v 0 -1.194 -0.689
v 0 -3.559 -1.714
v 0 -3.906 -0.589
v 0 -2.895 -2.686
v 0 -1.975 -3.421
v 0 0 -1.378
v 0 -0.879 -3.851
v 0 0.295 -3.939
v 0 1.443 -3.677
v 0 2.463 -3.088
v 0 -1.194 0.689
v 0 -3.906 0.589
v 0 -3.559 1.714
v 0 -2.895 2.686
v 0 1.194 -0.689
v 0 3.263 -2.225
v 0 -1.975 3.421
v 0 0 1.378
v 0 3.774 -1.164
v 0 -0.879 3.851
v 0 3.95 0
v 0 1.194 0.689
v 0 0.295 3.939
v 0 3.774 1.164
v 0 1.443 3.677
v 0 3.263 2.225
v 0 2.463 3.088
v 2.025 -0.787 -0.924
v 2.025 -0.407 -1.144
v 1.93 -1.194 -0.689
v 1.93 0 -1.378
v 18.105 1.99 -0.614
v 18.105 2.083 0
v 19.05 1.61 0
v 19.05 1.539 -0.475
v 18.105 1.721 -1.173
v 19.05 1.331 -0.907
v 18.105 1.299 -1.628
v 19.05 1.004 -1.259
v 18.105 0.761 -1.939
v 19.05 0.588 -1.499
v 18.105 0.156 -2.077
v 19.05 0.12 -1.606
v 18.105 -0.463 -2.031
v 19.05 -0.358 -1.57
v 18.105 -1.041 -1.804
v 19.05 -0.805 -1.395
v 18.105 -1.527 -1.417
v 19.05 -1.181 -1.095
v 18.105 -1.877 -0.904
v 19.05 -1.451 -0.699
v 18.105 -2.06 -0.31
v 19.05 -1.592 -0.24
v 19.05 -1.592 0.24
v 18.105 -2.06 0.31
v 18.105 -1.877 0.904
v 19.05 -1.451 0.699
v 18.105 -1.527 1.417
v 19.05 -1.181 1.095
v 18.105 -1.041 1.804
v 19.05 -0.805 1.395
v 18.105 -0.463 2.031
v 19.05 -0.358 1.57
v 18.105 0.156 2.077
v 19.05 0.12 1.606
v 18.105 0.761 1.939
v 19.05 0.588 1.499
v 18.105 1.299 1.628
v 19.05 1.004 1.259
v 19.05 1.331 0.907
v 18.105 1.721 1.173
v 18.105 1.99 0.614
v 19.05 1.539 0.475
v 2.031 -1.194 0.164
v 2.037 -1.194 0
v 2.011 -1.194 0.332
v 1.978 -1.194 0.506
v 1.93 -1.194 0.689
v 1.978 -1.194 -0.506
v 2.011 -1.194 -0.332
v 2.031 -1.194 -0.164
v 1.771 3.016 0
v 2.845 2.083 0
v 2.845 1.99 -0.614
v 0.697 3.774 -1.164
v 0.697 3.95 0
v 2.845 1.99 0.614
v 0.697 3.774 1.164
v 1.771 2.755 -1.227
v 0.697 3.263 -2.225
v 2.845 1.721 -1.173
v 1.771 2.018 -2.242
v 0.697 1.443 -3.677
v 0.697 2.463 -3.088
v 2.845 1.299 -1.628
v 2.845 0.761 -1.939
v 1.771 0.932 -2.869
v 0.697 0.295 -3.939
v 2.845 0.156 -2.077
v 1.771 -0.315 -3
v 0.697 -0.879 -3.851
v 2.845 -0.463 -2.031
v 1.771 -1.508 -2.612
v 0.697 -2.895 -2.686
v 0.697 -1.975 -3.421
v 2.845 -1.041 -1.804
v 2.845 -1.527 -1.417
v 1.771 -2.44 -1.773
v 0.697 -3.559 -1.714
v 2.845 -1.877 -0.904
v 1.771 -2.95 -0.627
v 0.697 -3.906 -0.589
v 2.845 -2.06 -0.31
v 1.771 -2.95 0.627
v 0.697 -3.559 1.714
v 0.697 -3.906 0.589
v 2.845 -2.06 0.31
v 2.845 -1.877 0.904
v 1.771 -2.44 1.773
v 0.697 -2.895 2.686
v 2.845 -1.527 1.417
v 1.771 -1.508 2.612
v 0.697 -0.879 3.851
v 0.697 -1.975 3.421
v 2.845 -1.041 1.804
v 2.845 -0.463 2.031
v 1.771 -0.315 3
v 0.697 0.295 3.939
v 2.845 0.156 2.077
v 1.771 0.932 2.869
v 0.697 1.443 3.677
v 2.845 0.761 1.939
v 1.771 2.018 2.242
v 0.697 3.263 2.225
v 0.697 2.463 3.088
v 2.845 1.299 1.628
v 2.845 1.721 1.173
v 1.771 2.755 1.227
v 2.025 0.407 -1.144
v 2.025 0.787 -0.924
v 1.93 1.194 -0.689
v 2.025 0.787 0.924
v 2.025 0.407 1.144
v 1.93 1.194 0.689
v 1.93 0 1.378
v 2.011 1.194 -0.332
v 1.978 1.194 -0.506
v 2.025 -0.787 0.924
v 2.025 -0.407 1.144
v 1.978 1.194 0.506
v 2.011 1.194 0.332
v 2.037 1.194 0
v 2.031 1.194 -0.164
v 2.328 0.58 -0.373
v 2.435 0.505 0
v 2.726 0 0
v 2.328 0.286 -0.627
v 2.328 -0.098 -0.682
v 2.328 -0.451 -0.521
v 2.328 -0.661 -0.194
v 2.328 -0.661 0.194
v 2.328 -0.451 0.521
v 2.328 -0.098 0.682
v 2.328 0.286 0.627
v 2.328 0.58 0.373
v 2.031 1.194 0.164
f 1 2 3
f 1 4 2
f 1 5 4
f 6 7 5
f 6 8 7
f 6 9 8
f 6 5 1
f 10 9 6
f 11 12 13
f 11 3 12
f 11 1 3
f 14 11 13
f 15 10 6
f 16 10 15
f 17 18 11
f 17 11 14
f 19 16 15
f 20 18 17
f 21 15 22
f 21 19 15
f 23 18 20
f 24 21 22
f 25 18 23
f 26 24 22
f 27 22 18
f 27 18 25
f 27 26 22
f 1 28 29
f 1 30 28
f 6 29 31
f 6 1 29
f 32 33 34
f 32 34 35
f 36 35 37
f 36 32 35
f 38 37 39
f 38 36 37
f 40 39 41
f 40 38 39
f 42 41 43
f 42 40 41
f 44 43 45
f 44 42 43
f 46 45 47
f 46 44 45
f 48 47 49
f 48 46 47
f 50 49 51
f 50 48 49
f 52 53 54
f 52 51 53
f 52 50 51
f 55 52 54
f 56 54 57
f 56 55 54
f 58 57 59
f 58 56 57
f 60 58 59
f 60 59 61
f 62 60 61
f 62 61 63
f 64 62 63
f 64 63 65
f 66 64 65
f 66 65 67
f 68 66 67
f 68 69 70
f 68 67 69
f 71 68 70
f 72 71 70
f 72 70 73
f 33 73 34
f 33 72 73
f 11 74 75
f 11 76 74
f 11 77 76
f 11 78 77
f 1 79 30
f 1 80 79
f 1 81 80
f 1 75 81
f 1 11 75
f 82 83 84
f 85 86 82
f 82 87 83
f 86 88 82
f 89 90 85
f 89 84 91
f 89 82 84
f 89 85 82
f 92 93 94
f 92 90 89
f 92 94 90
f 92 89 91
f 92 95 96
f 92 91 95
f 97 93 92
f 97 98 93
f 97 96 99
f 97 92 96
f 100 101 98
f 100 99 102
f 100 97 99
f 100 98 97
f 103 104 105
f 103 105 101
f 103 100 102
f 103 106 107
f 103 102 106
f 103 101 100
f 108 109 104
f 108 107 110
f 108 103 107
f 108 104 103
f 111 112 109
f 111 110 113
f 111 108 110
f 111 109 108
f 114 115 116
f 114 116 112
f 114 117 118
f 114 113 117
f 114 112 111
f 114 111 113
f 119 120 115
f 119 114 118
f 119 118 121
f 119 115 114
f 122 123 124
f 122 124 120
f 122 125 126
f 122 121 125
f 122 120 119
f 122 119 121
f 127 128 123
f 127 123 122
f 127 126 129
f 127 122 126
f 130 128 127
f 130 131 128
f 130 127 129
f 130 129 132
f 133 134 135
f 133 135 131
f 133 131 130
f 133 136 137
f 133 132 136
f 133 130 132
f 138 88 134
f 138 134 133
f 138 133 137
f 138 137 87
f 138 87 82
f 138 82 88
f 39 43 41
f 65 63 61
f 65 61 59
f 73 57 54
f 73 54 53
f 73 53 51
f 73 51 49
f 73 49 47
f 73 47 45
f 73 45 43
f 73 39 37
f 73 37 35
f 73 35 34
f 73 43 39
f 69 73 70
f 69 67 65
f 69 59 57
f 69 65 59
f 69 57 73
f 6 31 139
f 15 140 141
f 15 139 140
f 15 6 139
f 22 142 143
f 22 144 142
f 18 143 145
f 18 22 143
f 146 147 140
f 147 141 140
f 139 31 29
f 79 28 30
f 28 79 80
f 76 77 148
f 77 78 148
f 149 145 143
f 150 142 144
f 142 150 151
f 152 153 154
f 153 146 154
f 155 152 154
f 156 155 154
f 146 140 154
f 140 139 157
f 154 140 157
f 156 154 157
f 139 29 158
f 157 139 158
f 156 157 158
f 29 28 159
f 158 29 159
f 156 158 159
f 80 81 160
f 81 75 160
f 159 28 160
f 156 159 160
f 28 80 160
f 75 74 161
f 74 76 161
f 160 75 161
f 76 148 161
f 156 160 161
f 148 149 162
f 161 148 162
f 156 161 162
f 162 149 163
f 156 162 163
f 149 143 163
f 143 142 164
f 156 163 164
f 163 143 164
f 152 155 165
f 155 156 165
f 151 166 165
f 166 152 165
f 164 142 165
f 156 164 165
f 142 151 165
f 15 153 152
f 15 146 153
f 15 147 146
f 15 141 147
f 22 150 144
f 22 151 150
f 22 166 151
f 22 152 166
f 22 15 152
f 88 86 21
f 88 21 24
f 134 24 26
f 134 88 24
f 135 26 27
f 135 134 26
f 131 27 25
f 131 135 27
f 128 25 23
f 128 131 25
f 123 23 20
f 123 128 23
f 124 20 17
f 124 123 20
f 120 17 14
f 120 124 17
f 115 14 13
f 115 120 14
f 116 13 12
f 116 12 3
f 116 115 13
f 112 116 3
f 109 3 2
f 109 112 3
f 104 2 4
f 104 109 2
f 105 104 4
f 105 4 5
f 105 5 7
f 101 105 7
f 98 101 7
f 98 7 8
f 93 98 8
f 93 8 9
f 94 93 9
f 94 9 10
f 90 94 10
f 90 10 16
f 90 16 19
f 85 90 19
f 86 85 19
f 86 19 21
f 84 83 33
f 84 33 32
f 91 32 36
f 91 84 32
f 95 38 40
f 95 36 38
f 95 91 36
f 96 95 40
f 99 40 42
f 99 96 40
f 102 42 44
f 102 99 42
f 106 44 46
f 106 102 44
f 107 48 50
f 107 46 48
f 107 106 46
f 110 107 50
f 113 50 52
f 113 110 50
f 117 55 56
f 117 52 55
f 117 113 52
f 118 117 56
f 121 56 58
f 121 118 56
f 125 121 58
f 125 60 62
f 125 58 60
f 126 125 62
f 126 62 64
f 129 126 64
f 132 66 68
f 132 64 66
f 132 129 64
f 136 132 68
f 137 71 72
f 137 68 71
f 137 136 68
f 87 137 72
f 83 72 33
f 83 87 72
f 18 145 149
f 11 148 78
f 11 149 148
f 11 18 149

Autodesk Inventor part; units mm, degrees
ref_plane "YZ Plane" through (0, 0, 0) normal (1, 0, 0) x (0, 1, 0)
ref_plane "XZ Plane" through (0, 0, 0) normal (0, 1, 0) x (-1, 0, 0)
sketch "Sketch1" plane through (0, 0, 0) normal (0, 0, 1) x (1, 0, 0)
  line L0 (19.05, 0) -> (19.05, 2.0828)
  line L1 (19.05, 2.0828) -> (4.8293, 2.0828)
  line L2 (4.8293, 2.0828) -> (2.8448, 2.0828)
  line L3 (0, 3.9497) -> (0, 1.3785)
  line L4 (0, 1.3785) -> (1.9304, 1.3785)
  line L5 (1.9304, 1.3785) -> (2.7263, 0)
  line L6 (2.7263, 0) -> (19.05, 0)
  line L7 (0, 3.9497) -> (0.6972, 3.9497)
  line L8 (0.6972, 3.9497) -> (2.8448, 2.0828)
  line L9 (2.8448, 2.0828) -> (2.8448, 2.0828)
  line L10 (4.8293, 2.0828) -> (2.8448, 2.0828) construction
  line L11 (2.8448, 2.0828) -> (2.8448, 2.0828)
  line L12 (-3.81, 0) -> (22.86, 0) projected
  line L13 (0, -0.7899) -> (0, 4.7396) projected
  dimension "d0" = 19.05
  dimension "d1" = 14.2207
  dimension "d2" = 1.9304
  dimension "d3" = 4.1656
  dimension "d6" = 2.8448
  dimension "d7" = 41
  dimension "d8" = 2.757
  dimension "d9" = 60
  dimension "d10" = 7.8994
  dimension "d11" = 4.1656
  dimension "d12" = 1.9845
revolve "Body" add sketch "Sketch1" angle 360 about axis through (2.7263, 0, 0) along (1, 0, 0) contours L6 L5 L4 L3 L7 L8 L2 L1 L0
sketch "Sketch2" plane through (0, 0, 0) normal (-1, 0, 0) x (0, 0, 1)
  circle A0 centre (0, 0) radius 1.3785 projected
  line L0 (0, -5.5296) -> (0, 5.5296) projected
  line L1 (-5.5296, 0) -> (5.5296, 0) projected
  line L2 (1.3785, 0) -> (0.6892, -1.1938)
  line L3 (0.6892, -1.1938) -> (-0.6892, -1.1938)
  line L4 (-0.6892, -1.1938) -> (-1.3785, 0)
  line L5 (-1.3785, 0) -> (-0.6892, 1.1938)
  line L6 (-0.6892, 1.1938) -> (0.6892, 1.1938)
  line L7 (0.6892, 1.1938) -> (1.3785, 0)
  point P0 (0, 1.3785)
extrude "Slot" add sketch "Sketch2" against normal up to next contours L7 A0 | A0 L2 | L6 L0 A0 | A0 L0 L3 | L0 L6 A0 | A0 L3 L0 | L4 A0 | A0 L5
thread "Thread" size "8-32 UNC" class "2A" standard "ANSI Unified Screw Threads" length 14.2207
chamfer "Chamfer1" distance 0.4724 distance2 0.9449 1 edges at (19.05, -2.0828, 0) measured on face at (19.05, 0.3944, 0.7269)
ref_plane "Work Plane1" through (104.775, 0, 0) normal (0, 0, -1) x (1, 0, 0)
equation "\"d15\" = GEL"
equation "\"d17\" = -0.5 * SPD + 0.5 * GD"
equation "\"d18\" = GUL"
equation "\"d0\" = NLG"
equation "\"d1\" = GEL"
equation "\"d2\" = INTI"
equation "\"d3\" = GD"
equation "\"d6\" = KOH"
equation "\"d7\" = 0.5 * SEWI"
equation "\"d8\" = 1.1547 * SW"
equation "\"d10\" = KOD"
equation "\"d11\" = BDM"
equation "\"d12\" = GAL"
equation "\"NLG\" = 19.05"
equation "\"INTI\" = 1.9304"
equation "\"GEL\" = 14.2207"
equation "\"GAL\" = 1.9845"
equation "\"KOH\" = 2.8448"
equation "\"KOD\" = 7.8994"
equation "\"GUL\" = 0.94488"
equation "\"SPD\" = 3.22072"
equation "\"BDM\" = NND"
equation "\"GD\" = NND"
equation "\"SEWI\" = 82deg"
equation "\"SW\" = 2.3876"
equation "\"TOA\" = 30deg"
equation "\"GD1\" = SPD"
equation "\"THREADDIA\" = 4.1656"
equation "\"HHPTC\" = 0.79375"
equation "\"NND\" = 4.1656"
equation "\"E0\" = 1.155 * SW"
properties part number "ANSI B18.3 - 8-32 UNC x 0.75" material "Steel, Mild"
